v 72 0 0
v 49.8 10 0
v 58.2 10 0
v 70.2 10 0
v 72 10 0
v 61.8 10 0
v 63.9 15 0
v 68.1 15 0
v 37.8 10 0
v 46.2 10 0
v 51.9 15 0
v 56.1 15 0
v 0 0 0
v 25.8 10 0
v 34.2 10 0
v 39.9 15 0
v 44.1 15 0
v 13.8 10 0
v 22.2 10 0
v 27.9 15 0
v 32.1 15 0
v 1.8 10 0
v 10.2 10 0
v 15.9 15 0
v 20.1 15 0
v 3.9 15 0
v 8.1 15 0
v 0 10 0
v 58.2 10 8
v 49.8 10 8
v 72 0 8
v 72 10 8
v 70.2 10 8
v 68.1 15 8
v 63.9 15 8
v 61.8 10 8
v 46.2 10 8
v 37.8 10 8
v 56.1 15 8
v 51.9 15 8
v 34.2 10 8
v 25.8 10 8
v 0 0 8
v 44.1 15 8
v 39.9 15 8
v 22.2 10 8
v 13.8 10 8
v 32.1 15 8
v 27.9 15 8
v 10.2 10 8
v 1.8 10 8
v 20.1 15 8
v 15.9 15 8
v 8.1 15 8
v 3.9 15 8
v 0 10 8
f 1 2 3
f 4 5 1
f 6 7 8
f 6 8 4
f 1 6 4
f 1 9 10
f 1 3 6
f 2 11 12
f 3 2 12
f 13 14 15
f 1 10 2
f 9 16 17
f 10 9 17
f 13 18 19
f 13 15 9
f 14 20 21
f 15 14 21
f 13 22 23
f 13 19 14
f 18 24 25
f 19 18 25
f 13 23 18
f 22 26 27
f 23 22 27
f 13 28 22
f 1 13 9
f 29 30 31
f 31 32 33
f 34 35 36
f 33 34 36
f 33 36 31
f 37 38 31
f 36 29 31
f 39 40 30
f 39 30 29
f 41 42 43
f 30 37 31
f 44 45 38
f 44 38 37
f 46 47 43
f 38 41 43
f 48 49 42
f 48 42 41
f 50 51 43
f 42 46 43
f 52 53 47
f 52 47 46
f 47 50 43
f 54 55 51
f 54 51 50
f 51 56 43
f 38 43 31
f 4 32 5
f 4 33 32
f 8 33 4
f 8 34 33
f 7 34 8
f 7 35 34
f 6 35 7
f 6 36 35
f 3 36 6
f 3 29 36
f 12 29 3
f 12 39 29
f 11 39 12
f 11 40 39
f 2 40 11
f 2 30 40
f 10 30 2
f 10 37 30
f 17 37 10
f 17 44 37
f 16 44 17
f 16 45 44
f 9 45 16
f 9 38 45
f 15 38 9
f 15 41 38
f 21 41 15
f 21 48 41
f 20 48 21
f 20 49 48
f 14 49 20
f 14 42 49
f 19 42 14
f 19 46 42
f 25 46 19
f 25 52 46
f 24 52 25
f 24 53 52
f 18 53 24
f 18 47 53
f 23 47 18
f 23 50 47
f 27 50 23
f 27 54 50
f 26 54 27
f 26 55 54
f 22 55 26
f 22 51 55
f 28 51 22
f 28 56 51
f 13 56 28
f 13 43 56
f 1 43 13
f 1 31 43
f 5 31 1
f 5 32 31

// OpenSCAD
$fn = 32;

// ----------------------------------------------------------------------
// Gear rack: 6 teeth, pitch 12 mm
// ----------------------------------------------------------------------

// --- parameters (mm) ---
teeth = 6;                // number of teeth
pitch = 12;               // tooth pitch, X
root_w = 8.4;             // tooth width at the root
tip_w = 4.2;              // tooth width at the tip
base_h = 10;              // rack body height, Y
tooth_h = 5;              // tooth height above the body
plate_t = 8;              // rack width, Z (extrusion height)

rack_l = teeth * pitch;  // overall length
total_h = base_h + tooth_h;  // overall height

profile = [[0, 0], [72, 0], [72, 10], [70.2, 10], [68.1, 15], [63.9, 15], [61.8, 10], [58.2, 10], [56.1, 15], [51.9, 15], [49.8, 10], [46.2, 10], [44.1, 15], [39.9, 15], [37.8, 10], [34.2, 10], [32.1, 15], [27.9, 15], [25.8, 10], [22.2, 10], [20.1, 15], [15.9, 15], [13.8, 10], [10.2, 10], [8.1, 15], [3.9, 15], [1.8, 10], [0, 10]];  // primary outline, 28 points, counter clockwise

// --- the one profile operation ---
linear_extrude(height = plate_t) polygon(points = profile);
